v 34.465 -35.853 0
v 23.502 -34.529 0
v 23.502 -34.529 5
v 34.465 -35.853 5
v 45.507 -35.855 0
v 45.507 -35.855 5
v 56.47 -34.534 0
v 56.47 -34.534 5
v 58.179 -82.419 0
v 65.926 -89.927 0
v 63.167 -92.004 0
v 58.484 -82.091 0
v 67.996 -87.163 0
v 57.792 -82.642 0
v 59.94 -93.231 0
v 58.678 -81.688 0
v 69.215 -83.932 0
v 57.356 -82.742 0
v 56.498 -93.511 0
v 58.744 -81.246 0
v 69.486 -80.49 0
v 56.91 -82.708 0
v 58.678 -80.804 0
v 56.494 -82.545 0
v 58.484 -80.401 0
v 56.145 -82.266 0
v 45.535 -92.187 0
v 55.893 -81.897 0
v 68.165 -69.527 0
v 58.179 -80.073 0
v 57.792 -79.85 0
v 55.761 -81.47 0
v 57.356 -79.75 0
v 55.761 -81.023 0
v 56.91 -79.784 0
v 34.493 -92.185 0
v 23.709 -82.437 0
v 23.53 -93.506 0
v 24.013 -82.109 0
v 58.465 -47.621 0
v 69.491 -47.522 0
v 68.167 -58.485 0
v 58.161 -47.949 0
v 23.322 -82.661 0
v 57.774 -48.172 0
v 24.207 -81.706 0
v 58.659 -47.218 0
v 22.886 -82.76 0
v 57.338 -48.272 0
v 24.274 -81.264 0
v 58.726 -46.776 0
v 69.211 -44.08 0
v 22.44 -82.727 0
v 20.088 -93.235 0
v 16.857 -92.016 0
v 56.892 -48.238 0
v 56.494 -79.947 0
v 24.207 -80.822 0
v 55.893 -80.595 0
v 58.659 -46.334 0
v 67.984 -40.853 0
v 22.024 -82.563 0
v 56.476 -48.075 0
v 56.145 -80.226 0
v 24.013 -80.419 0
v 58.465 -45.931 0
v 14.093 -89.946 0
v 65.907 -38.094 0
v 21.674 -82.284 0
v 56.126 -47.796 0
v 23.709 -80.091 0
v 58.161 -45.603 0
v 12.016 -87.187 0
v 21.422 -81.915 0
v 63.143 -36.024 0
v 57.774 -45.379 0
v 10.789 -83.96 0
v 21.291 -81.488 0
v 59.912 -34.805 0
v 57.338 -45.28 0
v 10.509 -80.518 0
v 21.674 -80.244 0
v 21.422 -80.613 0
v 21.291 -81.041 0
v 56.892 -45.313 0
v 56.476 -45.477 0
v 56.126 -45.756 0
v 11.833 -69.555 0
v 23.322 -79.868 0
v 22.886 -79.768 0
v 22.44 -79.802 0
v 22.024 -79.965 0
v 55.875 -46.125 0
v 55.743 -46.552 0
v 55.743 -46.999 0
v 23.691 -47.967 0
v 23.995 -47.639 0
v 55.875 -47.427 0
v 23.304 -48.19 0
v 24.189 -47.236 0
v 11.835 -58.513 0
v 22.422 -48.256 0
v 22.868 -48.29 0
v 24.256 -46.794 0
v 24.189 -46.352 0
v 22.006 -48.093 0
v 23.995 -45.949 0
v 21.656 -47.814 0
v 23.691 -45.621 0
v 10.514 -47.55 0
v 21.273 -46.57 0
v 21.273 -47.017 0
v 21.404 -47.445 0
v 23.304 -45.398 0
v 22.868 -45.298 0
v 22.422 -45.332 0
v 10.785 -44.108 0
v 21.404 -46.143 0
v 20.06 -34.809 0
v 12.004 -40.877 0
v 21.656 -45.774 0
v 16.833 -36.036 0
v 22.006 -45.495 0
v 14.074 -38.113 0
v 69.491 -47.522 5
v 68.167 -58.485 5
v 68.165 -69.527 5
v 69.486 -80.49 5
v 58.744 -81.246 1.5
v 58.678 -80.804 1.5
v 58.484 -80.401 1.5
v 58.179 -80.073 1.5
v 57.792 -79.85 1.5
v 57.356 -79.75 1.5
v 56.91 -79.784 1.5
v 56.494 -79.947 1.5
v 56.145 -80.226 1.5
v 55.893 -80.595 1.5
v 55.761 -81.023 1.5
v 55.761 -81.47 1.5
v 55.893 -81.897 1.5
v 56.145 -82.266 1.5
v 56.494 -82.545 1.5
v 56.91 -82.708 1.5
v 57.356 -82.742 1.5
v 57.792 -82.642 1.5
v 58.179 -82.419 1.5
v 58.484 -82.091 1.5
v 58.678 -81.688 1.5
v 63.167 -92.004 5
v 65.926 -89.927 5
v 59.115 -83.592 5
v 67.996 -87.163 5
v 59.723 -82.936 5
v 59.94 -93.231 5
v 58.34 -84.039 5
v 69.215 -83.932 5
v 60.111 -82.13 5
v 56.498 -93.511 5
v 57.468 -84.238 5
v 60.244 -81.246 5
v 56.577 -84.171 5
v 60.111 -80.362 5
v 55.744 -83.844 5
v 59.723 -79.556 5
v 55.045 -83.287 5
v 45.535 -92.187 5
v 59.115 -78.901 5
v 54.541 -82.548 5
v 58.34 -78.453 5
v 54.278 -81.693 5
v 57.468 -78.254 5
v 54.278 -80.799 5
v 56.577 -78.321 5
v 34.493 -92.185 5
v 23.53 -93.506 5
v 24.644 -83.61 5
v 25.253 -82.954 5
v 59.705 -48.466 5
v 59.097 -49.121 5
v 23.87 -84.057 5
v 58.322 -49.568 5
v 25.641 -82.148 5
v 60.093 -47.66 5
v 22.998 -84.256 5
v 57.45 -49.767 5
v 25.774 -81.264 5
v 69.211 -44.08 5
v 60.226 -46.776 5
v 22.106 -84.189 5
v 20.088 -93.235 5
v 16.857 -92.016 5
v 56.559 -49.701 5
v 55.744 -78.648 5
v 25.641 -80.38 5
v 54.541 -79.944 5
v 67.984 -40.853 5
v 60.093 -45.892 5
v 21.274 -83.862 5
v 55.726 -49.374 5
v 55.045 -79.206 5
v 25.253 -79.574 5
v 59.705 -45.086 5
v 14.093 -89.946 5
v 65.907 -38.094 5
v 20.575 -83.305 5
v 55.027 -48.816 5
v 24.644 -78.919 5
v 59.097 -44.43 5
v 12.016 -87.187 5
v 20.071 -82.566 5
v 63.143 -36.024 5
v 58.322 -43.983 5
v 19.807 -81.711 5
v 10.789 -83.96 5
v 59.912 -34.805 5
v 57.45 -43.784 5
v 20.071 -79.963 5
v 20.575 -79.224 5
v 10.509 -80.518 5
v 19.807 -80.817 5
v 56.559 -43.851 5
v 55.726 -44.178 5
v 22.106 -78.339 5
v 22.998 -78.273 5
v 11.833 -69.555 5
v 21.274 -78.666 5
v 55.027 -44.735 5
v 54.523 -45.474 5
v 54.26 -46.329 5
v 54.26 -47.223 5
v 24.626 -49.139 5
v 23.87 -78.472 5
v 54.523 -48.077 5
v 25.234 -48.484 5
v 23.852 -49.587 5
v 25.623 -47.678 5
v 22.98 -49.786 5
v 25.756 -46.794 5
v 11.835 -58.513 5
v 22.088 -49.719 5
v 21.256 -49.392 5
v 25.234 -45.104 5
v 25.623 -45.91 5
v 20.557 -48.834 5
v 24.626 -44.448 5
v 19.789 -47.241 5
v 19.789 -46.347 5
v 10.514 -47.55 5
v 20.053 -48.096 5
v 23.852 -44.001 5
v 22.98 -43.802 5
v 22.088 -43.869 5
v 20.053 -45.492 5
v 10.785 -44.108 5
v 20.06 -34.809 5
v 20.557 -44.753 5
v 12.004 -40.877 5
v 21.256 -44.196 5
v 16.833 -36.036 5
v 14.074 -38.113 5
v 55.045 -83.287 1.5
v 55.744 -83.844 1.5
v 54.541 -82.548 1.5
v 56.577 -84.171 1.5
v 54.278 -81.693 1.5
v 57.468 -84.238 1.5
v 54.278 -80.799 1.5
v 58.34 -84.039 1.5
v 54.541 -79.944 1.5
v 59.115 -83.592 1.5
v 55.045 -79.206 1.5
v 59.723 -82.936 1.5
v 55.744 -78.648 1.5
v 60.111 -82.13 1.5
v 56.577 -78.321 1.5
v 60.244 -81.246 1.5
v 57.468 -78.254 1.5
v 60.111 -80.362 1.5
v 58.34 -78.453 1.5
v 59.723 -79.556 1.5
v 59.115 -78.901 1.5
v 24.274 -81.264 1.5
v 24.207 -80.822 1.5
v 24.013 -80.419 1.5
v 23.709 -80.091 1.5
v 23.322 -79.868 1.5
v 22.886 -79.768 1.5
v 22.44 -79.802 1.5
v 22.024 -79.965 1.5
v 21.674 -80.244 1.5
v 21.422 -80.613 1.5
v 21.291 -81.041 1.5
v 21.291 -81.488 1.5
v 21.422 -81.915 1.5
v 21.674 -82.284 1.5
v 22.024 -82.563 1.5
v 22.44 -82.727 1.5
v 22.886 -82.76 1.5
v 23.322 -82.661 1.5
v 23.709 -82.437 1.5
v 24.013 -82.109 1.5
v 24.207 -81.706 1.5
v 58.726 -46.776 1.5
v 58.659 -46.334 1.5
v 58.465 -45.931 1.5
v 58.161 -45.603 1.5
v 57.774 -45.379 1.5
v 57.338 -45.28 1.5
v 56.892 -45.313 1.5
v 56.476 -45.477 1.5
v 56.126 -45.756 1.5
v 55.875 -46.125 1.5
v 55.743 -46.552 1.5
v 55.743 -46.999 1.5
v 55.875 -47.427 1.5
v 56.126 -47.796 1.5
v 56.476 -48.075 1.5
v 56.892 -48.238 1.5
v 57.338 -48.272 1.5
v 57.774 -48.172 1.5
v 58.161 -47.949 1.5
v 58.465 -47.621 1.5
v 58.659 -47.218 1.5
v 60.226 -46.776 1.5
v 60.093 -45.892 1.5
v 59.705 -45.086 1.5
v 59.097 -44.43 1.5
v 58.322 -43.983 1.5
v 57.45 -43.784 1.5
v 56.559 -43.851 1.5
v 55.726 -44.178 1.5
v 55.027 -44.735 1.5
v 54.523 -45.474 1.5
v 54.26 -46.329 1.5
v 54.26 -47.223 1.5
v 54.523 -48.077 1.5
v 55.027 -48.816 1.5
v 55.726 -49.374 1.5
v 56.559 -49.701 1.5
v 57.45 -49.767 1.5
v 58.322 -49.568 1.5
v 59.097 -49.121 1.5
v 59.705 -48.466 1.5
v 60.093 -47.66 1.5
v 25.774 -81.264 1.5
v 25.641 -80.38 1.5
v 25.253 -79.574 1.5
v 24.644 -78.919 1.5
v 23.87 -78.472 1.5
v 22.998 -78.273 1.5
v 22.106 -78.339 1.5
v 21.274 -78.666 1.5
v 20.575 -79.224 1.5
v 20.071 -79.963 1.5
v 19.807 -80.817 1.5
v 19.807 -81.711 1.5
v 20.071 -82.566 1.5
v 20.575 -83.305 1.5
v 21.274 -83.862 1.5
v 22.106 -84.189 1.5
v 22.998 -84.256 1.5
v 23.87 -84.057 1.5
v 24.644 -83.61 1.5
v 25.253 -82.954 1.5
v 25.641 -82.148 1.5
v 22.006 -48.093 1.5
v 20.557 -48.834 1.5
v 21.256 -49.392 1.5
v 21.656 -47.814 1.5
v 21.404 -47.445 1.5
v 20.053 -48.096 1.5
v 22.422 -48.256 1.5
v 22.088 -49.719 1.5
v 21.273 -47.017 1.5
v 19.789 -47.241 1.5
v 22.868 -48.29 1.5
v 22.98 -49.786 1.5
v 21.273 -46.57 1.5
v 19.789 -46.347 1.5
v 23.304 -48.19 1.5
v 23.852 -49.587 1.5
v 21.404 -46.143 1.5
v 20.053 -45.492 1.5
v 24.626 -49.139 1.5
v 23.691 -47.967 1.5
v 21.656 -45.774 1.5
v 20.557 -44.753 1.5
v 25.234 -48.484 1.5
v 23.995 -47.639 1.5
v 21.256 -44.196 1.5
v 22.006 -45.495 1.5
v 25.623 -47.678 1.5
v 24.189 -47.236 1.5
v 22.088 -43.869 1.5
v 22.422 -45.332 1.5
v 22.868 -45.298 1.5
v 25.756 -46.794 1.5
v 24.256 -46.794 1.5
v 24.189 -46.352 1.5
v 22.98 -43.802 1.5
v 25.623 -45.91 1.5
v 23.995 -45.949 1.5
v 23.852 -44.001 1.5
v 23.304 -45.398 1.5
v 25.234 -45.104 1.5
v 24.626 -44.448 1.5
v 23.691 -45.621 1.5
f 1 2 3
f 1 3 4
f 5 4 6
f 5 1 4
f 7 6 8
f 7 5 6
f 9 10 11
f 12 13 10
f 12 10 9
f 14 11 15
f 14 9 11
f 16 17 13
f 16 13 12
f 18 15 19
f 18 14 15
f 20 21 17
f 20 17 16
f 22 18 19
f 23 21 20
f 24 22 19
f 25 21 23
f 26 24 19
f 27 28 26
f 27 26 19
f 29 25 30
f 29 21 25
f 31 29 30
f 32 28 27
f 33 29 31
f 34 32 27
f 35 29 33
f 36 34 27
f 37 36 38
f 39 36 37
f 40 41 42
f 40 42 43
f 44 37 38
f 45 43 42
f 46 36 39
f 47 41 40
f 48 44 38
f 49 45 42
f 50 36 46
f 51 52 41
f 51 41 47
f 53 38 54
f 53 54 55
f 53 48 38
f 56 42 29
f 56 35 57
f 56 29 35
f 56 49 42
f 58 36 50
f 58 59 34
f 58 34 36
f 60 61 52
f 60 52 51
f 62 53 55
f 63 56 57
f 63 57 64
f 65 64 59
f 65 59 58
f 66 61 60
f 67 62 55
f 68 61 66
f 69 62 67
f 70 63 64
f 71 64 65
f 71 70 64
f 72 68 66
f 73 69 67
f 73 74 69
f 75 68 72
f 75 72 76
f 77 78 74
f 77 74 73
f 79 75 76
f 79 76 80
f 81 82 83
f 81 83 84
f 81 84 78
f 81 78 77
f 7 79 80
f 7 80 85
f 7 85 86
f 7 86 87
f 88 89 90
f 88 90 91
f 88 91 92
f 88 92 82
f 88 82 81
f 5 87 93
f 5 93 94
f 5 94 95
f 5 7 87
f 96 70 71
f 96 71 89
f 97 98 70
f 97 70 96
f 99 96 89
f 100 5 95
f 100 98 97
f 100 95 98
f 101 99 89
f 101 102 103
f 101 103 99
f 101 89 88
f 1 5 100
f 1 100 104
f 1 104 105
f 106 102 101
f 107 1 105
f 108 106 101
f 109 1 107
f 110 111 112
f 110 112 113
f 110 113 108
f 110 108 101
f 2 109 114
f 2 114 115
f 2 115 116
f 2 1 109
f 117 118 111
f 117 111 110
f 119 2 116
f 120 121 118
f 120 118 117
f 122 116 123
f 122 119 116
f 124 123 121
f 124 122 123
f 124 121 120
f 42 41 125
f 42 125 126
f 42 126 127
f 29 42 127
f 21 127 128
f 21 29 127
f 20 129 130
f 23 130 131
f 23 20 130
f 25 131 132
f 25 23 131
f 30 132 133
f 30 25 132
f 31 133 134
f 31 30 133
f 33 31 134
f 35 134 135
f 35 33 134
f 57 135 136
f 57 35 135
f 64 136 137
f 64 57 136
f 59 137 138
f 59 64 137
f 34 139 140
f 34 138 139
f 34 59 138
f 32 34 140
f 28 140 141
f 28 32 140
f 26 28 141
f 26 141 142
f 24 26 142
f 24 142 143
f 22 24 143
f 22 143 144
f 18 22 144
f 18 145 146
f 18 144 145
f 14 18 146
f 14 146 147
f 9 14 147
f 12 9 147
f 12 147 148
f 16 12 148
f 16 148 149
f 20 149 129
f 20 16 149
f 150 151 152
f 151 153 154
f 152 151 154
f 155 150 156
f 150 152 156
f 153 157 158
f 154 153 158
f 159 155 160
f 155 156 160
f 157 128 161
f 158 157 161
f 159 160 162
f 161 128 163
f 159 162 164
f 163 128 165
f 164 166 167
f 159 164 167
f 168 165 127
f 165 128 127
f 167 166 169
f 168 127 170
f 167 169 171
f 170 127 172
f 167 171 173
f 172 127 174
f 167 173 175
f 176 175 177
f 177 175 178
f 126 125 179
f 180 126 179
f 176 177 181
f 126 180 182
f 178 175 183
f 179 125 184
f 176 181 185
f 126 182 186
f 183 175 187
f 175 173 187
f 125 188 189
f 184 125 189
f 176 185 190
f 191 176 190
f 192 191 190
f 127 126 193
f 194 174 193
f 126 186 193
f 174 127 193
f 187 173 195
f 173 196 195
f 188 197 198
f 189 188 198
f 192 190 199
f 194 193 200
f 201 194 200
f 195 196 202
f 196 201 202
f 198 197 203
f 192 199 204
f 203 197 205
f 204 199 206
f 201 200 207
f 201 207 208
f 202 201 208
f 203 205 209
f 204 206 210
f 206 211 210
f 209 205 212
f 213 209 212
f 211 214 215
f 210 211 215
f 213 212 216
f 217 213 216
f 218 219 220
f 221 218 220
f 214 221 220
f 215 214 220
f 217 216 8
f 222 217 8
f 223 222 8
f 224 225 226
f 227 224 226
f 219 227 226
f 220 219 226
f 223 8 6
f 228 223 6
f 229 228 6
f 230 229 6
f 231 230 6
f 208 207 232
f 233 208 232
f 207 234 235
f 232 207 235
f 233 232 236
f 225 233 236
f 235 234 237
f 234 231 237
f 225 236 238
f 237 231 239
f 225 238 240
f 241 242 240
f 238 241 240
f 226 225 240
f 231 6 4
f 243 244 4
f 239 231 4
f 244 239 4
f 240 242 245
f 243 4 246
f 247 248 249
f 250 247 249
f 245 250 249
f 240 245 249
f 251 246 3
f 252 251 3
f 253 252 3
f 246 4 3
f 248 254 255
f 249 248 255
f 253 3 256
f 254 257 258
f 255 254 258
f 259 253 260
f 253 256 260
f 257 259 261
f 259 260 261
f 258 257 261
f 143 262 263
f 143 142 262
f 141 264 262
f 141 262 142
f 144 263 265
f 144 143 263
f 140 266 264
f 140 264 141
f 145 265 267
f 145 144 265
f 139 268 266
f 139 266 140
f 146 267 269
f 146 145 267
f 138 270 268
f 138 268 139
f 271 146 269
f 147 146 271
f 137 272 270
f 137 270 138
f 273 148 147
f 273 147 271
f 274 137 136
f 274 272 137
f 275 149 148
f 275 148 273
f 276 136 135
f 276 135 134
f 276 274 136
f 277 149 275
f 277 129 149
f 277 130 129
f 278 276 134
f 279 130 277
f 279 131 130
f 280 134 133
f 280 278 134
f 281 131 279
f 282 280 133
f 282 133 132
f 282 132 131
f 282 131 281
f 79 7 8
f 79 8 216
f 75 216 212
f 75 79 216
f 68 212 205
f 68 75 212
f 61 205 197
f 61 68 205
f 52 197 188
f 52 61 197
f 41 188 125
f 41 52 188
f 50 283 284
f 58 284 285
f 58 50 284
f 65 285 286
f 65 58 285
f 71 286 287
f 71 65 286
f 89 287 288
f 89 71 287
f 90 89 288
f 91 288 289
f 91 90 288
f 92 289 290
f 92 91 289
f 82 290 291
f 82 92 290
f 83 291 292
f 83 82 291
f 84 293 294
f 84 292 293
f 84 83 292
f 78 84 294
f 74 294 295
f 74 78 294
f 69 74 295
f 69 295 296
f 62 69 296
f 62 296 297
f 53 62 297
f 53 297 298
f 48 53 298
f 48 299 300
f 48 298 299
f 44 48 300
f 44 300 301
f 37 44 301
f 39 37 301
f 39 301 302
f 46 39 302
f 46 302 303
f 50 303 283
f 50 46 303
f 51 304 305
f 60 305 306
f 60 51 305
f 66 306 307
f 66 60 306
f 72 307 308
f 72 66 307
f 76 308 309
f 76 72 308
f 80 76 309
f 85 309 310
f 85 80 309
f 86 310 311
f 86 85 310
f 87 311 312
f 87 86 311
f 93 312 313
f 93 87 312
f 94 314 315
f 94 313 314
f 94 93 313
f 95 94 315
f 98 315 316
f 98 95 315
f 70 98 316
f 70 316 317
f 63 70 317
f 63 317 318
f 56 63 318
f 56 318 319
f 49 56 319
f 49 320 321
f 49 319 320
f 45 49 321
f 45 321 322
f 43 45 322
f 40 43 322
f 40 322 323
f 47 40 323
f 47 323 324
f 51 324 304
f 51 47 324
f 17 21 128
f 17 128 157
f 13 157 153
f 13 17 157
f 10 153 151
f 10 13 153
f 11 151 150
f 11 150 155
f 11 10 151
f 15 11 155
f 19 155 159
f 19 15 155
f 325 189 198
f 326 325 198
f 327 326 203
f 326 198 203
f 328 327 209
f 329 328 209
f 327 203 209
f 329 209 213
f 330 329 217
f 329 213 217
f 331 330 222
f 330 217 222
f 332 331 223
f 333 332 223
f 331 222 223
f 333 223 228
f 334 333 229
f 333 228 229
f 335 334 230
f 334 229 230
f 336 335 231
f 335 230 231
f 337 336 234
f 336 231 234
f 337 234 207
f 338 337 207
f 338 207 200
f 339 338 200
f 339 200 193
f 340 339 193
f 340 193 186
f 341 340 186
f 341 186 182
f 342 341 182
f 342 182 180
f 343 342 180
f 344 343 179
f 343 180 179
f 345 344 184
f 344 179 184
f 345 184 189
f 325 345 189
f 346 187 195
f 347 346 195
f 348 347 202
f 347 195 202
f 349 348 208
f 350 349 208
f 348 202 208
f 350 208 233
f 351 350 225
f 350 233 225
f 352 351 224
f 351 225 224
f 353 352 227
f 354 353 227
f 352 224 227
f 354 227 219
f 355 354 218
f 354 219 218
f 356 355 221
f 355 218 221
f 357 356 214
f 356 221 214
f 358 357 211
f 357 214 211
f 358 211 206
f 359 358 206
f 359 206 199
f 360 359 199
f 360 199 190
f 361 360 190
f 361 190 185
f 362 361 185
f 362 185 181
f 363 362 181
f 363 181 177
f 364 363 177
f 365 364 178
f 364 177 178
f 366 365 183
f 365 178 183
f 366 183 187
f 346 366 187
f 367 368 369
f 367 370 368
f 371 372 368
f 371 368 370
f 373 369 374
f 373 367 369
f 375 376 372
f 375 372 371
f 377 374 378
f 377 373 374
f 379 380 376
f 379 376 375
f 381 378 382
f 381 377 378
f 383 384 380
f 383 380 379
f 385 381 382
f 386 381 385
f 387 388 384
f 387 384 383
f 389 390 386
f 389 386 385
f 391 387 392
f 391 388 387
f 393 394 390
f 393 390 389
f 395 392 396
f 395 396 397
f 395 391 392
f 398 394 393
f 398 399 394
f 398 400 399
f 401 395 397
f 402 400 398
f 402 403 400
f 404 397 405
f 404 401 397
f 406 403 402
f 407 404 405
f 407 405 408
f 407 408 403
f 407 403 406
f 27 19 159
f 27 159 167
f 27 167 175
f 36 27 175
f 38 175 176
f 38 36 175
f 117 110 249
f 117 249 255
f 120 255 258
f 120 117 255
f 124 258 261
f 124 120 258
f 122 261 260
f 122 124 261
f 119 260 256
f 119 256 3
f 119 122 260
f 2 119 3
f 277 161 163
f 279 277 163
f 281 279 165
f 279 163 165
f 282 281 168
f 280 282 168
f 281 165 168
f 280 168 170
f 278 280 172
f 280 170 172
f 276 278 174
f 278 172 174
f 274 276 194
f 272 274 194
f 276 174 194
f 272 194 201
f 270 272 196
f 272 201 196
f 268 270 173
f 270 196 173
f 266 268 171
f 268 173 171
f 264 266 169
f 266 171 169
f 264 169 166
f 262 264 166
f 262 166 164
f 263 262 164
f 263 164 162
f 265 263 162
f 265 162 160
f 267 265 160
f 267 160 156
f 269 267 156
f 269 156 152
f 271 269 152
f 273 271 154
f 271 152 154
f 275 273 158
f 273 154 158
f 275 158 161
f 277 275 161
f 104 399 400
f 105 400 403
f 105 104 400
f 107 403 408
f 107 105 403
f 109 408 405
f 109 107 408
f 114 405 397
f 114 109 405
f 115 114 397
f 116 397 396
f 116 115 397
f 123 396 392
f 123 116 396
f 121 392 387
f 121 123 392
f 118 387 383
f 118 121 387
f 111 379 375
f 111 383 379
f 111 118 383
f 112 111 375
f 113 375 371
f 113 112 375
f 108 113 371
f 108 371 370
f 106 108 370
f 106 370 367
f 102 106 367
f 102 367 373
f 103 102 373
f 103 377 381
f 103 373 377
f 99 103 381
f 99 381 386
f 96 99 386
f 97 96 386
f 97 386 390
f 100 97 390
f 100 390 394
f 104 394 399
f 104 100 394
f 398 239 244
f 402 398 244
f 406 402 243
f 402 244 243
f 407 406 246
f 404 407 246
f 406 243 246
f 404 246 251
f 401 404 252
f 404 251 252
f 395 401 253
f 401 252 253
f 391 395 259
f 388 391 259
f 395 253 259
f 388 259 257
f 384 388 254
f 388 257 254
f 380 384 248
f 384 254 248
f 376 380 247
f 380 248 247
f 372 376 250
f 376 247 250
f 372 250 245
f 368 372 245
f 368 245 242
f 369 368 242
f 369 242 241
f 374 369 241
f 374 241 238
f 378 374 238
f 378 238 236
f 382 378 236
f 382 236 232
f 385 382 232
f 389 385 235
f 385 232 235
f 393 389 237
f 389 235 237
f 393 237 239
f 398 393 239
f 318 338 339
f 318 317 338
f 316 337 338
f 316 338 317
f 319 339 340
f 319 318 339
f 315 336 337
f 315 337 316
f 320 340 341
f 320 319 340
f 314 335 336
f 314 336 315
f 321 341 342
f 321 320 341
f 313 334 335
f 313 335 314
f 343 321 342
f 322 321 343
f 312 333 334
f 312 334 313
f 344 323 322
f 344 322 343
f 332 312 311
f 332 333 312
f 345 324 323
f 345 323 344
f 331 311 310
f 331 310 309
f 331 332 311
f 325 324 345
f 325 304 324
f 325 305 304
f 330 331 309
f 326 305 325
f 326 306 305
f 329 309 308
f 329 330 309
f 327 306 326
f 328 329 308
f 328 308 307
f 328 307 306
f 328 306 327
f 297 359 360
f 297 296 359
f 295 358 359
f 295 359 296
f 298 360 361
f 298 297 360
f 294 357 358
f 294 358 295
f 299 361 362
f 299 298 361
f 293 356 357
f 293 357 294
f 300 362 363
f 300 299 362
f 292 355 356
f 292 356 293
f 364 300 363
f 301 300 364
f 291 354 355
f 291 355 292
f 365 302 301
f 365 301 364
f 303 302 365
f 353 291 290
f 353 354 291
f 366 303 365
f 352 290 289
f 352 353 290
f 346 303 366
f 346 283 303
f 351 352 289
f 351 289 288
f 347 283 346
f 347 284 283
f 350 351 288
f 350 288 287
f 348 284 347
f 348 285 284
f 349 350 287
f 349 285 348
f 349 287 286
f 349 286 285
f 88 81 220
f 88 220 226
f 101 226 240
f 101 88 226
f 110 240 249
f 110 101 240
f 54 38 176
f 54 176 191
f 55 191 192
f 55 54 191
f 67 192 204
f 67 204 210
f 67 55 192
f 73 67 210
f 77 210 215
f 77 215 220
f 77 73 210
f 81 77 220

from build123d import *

# Parameters (mm, degrees)
SKETCH1_R           = 1.5
BOSS_EXTRUDE1_DEPTH = 5
SKETCH2_R           = 3
CUT_EXTRUDE2_DEPTH  = 3.5


with BuildPart() as part:
    # Sketch1 → Boss-Extrude1 (new body)
    with BuildSketch(Plane.XY):
        with BuildLine():
            ThreePointArc((23.501924453, -34.528637882), (39.985677368, -36.01999904), (56.469893836, -34.533770361))
            ThreePointArc((56.469893836, -34.533770361), (65.906534639, -38.094436046), (69.491362273, -47.521924608))
            ThreePointArc((69.491362273, -47.521924608), (68.000001115, -64.005677523), (69.486229793, -80.489893991))
            ThreePointArc((69.486229793, -80.489893991), (65.925564109, -89.926534793), (56.498075547, -93.511362427))
            ThreePointArc((56.498075547, -93.511362427), (40.014322632, -92.02000127), (23.530106164, -93.506229948))
            ThreePointArc((23.530106164, -93.506229948), (14.093465361, -89.945564264), (10.508637727, -80.518075701))
            ThreePointArc((10.508637727, -80.518075701), (11.999998885, -64.034322787), (10.513770207, -47.550106319))
            ThreePointArc((10.513770207, -47.550106319), (14.074435891, -38.113465516), (23.501924453, -34.528637882))
        make_face()
        with Locations((22.755781837, -46.793928993)):
            Circle(SKETCH1_R, mode=Mode.SUBTRACT)
        with Locations((57.226071162, -46.775781992)):
            Circle(SKETCH1_R, mode=Mode.SUBTRACT)
        with Locations((57.244218163, -81.246071317)):
            Circle(SKETCH1_R, mode=Mode.SUBTRACT)
        with Locations((22.773928838, -81.264218317)):
            Circle(SKETCH1_R, mode=Mode.SUBTRACT)
    extrude(amount=BOSS_EXTRUDE1_DEPTH)

    # Sketch2 → Cut-Extrude2 (cut)
    with BuildSketch(Plane.XY.offset(5)):
        with Locations((22.755781837, -46.793928993)):
            Circle(SKETCH2_R)
        with Locations((57.226071162, -46.775781992)):
            Circle(SKETCH2_R)
        with Locations((57.244218163, -81.246071317)):
            Circle(SKETCH2_R)
        with Locations((22.773928838, -81.264218317)):
            Circle(SKETCH2_R)
    extrude(amount=-CUT_EXTRUDE2_DEPTH, mode=Mode.SUBTRACT)


solid = part.part
